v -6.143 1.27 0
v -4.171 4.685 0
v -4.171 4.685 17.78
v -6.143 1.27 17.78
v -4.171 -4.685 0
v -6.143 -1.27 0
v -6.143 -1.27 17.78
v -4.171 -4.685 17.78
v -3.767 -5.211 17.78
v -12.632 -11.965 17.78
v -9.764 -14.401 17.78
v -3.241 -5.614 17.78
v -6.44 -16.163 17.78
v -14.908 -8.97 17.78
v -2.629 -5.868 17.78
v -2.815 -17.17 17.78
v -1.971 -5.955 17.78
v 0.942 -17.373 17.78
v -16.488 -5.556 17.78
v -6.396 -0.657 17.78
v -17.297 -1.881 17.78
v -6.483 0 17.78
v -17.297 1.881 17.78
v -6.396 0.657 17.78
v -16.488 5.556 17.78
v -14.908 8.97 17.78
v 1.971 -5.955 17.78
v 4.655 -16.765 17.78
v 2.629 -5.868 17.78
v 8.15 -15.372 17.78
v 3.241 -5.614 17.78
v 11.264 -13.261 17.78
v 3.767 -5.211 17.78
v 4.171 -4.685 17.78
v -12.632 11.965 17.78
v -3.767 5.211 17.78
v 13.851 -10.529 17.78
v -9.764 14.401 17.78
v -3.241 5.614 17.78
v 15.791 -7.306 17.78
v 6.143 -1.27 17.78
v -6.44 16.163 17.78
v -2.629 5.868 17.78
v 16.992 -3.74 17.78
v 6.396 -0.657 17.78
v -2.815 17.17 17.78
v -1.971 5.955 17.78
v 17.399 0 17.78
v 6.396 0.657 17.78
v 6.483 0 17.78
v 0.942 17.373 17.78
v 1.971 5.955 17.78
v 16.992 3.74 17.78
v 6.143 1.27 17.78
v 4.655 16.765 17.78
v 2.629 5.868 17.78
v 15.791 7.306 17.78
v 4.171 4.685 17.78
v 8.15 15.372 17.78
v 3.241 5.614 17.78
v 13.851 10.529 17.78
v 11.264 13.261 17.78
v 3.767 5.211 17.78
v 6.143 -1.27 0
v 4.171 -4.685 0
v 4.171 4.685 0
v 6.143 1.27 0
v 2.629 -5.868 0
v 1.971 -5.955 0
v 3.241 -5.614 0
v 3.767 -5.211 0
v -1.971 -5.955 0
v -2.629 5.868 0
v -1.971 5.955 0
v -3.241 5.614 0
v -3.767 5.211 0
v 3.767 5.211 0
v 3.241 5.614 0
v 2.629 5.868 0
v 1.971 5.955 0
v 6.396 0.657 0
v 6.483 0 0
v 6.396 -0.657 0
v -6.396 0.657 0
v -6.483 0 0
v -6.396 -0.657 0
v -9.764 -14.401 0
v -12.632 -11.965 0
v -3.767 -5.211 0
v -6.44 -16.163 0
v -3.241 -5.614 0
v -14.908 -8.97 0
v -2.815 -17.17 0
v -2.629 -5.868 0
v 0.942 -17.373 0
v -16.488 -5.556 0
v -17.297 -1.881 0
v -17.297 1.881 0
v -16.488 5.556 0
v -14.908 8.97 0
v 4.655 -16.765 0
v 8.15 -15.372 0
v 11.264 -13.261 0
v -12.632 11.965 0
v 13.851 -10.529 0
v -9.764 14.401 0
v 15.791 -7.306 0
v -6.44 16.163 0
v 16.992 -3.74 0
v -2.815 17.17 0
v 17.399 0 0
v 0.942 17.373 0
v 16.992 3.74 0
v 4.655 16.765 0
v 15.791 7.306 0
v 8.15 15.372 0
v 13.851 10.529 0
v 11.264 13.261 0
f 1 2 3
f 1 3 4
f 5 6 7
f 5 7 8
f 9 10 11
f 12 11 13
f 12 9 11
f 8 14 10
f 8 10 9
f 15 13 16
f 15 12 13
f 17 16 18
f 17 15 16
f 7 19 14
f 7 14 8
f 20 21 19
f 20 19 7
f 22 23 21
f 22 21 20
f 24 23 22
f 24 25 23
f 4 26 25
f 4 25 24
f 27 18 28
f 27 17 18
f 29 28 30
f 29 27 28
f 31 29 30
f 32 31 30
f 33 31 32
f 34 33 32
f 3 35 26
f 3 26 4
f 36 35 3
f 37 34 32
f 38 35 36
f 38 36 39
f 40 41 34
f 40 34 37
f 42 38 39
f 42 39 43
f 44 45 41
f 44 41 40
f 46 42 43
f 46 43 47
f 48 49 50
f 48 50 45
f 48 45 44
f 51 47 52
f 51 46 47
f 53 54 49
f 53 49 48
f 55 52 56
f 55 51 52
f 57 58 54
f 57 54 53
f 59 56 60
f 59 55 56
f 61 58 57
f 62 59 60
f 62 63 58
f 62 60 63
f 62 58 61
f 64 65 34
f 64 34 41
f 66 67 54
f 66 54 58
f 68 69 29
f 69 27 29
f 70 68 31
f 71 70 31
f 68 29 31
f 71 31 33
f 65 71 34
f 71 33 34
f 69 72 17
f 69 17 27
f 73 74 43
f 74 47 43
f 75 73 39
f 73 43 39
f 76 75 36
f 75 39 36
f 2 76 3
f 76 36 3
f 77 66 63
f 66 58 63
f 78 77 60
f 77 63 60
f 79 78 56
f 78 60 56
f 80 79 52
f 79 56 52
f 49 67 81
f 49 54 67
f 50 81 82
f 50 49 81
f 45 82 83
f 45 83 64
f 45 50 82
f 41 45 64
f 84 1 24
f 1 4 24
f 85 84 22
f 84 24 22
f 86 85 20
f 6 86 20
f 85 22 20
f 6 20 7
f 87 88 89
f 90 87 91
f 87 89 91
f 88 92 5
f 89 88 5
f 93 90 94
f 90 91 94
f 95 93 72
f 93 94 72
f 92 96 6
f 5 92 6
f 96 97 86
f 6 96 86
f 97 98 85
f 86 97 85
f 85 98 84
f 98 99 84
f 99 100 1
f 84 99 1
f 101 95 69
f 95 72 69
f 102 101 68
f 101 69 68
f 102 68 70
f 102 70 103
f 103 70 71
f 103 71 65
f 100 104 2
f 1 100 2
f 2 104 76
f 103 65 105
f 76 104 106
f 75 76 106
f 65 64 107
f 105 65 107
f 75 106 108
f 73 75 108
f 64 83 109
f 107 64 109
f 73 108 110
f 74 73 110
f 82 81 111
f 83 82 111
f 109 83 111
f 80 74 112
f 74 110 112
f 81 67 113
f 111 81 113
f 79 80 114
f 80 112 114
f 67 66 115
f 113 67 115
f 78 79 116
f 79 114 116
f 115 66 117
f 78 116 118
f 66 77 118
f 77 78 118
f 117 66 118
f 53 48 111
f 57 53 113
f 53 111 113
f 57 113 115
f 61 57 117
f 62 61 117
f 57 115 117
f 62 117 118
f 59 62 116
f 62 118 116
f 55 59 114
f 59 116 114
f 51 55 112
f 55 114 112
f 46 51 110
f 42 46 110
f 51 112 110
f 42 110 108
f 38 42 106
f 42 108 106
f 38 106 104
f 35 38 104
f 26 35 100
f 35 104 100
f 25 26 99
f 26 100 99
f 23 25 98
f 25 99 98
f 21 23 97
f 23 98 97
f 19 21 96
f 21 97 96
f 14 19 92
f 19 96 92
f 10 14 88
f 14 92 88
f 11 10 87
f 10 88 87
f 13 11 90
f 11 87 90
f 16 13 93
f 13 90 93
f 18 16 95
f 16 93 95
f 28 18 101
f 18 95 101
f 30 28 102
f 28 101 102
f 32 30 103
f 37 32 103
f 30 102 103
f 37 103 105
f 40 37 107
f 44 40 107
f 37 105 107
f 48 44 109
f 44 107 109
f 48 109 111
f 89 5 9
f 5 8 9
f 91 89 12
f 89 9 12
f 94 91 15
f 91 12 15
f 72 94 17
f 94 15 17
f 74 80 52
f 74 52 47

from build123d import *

# Parameters (mm, degrees)
SKETCH1_R           = 17.399
BOSS_EXTRUDE1_DEPTH = 17.78
FILLET1_R           = 2.54


with BuildPart() as part:
    # Sketch1 → Boss-Extrude1 (new body)
    with BuildSketch(Plane.XY):
        Circle(SKETCH1_R)
        Polygon((6.87578, 0), (3.43789, 5.954600151), (-3.43789, 5.954600151), (-6.87578, 0), (-3.43789, -5.954600151), (3.43789, -5.954600151), align=None, mode=Mode.SUBTRACT)
    extrude(amount=BOSS_EXTRUDE1_DEPTH)

    # Fillet1
    fillet1_edges = [part.edges().sort_by_distance(p)[0] for p in [
        (6.87578, 0, 8.89),
        (3.43789, 5.954600151, 8.89),
        (-3.43789, 5.954600151, 8.89),
        (-6.87578, 0, 8.89),
        (-3.43789, -5.954600151, 8.89),
        (3.43789, -5.954600151, 8.89),
    ]]
    fillet(fillet1_edges, radius=FILLET1_R)


solid = part.part
